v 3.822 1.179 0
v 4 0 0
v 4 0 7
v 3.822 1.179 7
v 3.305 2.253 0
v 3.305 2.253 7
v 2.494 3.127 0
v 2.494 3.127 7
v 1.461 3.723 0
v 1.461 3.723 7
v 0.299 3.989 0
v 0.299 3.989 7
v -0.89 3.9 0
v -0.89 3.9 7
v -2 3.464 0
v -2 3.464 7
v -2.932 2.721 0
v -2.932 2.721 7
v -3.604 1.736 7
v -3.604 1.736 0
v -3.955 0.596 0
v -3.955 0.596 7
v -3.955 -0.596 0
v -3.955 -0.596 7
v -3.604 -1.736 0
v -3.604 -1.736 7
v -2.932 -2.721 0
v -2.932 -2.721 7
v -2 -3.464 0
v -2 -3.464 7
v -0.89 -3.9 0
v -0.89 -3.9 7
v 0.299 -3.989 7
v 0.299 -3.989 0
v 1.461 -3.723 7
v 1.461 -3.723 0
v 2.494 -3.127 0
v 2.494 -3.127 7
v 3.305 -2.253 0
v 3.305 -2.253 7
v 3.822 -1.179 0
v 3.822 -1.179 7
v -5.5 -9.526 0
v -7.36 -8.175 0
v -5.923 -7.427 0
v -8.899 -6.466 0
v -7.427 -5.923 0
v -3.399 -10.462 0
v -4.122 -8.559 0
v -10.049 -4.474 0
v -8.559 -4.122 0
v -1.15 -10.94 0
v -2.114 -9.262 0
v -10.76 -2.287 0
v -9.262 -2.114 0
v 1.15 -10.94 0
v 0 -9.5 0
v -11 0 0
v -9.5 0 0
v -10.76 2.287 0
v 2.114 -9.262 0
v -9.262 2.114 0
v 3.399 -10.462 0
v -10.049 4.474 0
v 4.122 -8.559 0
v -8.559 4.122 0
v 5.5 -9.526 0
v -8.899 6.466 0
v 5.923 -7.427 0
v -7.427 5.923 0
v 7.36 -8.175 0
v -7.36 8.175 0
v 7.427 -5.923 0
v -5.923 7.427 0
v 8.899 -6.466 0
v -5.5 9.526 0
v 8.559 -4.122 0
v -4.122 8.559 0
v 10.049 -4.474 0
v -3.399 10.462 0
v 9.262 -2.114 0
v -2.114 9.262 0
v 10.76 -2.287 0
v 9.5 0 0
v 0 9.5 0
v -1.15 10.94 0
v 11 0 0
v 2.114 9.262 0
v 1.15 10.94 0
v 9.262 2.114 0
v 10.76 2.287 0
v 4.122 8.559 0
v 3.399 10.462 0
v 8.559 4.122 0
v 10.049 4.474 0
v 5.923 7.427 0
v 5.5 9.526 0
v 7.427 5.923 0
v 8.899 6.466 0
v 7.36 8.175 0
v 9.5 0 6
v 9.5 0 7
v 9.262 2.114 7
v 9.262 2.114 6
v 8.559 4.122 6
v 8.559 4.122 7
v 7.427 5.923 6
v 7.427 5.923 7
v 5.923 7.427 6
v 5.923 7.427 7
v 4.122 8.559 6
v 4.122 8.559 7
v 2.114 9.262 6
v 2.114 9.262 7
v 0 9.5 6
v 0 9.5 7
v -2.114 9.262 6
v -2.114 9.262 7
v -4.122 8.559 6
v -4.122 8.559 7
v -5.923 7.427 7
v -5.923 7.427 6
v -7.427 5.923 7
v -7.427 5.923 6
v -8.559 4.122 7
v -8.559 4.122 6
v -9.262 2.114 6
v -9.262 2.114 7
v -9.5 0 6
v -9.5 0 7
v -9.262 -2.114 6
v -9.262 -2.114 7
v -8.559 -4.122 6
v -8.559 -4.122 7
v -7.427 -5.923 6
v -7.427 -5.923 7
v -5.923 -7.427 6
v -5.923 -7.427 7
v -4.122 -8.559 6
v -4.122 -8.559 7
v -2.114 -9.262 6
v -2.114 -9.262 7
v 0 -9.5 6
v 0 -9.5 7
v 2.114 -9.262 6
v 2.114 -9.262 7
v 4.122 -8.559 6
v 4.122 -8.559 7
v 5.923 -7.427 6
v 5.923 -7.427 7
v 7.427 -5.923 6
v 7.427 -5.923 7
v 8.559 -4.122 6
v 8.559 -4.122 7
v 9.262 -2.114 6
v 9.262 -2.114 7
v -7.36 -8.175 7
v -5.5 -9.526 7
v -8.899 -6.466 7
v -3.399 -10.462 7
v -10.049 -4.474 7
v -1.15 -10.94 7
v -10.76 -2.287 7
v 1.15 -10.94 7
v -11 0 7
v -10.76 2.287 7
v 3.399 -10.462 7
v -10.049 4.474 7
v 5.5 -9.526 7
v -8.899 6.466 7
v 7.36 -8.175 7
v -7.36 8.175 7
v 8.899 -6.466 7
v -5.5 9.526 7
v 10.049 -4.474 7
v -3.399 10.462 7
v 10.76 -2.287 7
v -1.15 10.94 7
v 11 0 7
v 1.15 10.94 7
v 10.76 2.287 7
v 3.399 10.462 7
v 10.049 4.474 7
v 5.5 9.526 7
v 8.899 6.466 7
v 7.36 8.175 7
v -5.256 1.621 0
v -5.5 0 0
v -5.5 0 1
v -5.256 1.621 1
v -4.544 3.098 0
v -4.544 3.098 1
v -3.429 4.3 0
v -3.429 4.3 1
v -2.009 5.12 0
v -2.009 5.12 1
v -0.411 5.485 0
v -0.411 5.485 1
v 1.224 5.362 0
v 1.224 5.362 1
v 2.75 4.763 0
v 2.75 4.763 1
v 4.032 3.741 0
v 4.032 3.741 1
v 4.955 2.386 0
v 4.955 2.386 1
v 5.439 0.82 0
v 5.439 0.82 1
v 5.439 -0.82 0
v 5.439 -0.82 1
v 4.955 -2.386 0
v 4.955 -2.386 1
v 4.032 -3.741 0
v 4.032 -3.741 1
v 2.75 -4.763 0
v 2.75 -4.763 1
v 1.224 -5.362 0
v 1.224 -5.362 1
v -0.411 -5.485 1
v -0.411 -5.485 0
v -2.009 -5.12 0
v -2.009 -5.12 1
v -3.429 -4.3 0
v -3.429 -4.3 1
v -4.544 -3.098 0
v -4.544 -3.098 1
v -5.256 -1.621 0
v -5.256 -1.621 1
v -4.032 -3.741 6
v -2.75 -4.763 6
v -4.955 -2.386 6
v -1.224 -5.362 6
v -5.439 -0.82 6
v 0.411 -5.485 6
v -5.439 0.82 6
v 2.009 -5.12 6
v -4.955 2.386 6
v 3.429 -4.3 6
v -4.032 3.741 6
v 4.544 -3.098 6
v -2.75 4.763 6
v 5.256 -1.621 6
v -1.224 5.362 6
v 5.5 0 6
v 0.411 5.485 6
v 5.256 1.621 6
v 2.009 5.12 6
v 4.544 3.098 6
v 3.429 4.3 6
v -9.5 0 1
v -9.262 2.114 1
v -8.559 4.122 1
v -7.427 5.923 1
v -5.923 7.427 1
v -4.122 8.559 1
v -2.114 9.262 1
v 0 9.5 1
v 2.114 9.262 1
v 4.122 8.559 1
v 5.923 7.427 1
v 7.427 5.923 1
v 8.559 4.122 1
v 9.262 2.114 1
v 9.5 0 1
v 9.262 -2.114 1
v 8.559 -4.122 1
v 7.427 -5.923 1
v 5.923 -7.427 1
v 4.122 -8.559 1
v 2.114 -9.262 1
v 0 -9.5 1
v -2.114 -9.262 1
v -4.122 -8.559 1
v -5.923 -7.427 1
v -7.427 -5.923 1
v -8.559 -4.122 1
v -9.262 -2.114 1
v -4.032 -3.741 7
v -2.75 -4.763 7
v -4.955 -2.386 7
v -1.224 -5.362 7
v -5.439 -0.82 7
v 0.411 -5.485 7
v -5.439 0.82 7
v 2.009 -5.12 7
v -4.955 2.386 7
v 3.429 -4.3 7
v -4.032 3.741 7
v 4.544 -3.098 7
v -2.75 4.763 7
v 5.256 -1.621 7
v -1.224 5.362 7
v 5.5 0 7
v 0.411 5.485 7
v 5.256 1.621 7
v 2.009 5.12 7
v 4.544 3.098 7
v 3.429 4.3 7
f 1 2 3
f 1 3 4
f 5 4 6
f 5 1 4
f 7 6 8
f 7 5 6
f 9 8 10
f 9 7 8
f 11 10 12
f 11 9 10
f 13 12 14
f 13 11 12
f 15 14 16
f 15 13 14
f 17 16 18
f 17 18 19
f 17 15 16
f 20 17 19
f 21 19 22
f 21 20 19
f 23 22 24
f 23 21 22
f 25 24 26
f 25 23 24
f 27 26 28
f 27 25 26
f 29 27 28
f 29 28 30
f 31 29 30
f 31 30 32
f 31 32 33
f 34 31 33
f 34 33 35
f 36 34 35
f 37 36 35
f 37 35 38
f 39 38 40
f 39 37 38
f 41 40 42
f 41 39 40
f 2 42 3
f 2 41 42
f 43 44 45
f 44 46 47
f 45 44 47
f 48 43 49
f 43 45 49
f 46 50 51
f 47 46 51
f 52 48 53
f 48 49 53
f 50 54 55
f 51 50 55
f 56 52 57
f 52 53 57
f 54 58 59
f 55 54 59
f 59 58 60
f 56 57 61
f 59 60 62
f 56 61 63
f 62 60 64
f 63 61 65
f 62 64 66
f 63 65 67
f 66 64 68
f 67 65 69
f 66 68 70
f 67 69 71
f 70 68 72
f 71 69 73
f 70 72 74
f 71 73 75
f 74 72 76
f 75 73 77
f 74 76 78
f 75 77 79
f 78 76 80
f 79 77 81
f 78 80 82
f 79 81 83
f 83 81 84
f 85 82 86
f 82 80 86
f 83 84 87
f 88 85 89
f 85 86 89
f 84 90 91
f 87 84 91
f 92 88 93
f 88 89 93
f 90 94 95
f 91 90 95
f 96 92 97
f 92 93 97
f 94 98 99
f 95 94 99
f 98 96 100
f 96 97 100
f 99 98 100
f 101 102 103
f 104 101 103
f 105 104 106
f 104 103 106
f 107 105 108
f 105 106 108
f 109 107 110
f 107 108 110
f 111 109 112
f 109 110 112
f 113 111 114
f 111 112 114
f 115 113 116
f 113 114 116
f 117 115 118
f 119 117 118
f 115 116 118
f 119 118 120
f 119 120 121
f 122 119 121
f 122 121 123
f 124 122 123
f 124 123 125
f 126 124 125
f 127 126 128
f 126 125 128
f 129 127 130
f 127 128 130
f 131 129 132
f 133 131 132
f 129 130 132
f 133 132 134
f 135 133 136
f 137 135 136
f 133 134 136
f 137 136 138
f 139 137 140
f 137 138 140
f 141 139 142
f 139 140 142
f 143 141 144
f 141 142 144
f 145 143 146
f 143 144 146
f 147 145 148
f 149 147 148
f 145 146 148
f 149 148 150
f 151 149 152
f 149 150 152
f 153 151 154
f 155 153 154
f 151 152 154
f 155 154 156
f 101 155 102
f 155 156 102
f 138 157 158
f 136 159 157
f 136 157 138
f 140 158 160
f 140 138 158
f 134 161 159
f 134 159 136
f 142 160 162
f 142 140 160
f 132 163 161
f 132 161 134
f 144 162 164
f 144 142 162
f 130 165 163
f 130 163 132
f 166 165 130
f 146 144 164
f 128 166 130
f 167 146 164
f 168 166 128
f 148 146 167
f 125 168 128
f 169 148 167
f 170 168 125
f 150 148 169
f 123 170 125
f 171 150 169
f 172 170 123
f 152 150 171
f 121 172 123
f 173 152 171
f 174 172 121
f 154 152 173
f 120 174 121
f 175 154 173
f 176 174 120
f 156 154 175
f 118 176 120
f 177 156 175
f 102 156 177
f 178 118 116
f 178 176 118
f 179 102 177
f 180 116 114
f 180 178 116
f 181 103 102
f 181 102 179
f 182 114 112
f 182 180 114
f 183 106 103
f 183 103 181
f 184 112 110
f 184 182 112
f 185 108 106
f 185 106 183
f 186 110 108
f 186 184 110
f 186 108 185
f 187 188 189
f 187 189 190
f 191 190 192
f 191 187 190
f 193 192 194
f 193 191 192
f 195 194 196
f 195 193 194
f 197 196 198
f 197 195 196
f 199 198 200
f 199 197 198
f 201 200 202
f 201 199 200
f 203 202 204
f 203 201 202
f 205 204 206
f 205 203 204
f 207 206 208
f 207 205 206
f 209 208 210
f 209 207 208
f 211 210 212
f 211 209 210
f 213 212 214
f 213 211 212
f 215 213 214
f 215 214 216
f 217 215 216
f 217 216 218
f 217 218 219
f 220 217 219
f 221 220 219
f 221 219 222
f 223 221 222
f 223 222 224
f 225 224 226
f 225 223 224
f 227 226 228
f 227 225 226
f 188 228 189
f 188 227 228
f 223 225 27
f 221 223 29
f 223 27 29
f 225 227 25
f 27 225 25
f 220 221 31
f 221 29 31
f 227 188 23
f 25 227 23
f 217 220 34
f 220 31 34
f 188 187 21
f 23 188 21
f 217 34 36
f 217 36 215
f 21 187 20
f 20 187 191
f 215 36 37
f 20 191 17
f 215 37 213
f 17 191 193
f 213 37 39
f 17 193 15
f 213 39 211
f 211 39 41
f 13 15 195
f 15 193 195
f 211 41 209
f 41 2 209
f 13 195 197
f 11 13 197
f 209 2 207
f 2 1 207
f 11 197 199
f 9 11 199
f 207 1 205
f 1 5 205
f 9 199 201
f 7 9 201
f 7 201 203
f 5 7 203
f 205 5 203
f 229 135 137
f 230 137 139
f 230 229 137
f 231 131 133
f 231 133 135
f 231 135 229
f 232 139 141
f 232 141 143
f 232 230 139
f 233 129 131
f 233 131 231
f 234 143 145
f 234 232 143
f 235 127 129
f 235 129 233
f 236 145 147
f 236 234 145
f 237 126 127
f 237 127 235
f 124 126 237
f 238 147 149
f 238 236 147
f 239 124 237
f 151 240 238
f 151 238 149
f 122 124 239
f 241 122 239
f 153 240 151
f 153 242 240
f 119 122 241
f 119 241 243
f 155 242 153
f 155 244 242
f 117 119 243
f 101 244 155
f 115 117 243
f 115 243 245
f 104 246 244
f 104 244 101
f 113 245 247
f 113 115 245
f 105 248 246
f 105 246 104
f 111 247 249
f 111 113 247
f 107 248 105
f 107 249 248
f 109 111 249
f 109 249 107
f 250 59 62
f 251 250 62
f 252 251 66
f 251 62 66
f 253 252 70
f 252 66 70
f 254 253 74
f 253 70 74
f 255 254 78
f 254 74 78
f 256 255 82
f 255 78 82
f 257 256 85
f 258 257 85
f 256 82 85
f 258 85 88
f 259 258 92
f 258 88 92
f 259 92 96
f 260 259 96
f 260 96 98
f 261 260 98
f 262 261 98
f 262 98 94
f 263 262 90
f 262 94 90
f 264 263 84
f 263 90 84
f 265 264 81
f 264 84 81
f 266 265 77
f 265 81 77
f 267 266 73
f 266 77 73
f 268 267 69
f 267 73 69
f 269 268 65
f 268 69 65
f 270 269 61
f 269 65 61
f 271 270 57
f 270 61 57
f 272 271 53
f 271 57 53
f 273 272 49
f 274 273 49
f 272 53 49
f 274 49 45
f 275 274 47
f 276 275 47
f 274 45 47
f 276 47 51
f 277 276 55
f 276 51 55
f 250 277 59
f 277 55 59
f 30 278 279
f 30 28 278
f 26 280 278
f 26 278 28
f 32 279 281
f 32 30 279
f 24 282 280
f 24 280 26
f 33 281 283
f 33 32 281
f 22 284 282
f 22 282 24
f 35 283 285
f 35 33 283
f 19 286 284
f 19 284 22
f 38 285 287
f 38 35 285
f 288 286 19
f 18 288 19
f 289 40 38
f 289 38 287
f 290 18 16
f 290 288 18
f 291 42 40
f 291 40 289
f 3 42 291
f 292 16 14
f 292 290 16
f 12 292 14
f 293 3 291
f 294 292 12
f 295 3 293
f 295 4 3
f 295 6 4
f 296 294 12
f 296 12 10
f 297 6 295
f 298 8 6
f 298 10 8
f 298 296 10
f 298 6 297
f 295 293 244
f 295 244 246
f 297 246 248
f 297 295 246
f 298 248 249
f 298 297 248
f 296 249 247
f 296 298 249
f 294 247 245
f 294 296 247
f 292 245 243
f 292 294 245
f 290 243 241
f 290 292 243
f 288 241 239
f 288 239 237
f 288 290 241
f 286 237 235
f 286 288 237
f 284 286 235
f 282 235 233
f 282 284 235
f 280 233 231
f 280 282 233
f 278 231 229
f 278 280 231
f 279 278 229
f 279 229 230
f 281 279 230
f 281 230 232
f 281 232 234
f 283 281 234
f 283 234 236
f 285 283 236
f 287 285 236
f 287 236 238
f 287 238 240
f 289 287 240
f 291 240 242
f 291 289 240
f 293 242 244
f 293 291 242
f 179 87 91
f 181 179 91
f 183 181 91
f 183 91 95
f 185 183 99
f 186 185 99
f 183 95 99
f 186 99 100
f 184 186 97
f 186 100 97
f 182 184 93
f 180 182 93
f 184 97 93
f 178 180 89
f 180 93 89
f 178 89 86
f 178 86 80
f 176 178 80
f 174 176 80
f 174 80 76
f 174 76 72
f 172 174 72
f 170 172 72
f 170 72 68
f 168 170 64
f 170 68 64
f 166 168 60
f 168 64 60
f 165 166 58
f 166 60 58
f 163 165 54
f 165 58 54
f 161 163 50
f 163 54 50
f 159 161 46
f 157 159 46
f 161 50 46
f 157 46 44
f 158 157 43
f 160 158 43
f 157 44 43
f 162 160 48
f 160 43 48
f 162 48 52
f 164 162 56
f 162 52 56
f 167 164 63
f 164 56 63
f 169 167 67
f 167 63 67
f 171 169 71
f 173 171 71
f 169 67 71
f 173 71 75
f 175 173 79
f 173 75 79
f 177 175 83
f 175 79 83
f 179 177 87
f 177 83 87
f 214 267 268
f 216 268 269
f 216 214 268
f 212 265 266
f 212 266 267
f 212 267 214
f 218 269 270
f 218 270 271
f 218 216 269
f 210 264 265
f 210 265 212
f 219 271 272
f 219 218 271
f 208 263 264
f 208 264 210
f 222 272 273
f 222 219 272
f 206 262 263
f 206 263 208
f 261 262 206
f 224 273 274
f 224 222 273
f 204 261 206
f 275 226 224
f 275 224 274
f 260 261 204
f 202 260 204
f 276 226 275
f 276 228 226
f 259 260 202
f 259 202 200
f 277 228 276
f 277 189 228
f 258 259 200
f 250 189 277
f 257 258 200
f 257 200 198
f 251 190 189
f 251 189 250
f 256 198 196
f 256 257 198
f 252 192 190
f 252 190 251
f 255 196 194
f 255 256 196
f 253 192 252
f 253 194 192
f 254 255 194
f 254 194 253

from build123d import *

# Parameters (mm, degrees)
SKETCH1_R           = 11
SKETCH1_R_2         = 4
BOSS_EXTRUDE1_DEPTH = 7
SKETCH2_R           = 9.5
SKETCH2_R_2         = 5.5
CUT_EXTRUDE1_DEPTH  = 1
SKETCH3_R           = 9.5
SKETCH3_R_2         = 5.5
CUT_EXTRUDE2_DEPTH  = 1


with BuildPart() as part:
    # Sketch1 → Boss-Extrude1 (new body)
    with BuildSketch(Plane.XY):
        Circle(SKETCH1_R)
        Circle(SKETCH1_R_2, mode=Mode.SUBTRACT)
    extrude(amount=BOSS_EXTRUDE1_DEPTH)

    # Sketch2 → Cut-Extrude1 (cut)
    with BuildSketch(Plane.XY.offset(7)):
        Circle(SKETCH2_R)
        Circle(SKETCH2_R_2, mode=Mode.SUBTRACT)
    extrude(amount=-CUT_EXTRUDE1_DEPTH, mode=Mode.SUBTRACT)

    # Sketch3 → Cut-Extrude2 (cut)
    with BuildSketch(Plane(origin=(0, 0, 0), x_dir=(-1, 0, 0), z_dir=(0, 0, -1))):
        Circle(SKETCH3_R)
        Circle(SKETCH3_R_2, mode=Mode.SUBTRACT)
    extrude(amount=-CUT_EXTRUDE2_DEPTH, mode=Mode.SUBTRACT)


solid = part.part
